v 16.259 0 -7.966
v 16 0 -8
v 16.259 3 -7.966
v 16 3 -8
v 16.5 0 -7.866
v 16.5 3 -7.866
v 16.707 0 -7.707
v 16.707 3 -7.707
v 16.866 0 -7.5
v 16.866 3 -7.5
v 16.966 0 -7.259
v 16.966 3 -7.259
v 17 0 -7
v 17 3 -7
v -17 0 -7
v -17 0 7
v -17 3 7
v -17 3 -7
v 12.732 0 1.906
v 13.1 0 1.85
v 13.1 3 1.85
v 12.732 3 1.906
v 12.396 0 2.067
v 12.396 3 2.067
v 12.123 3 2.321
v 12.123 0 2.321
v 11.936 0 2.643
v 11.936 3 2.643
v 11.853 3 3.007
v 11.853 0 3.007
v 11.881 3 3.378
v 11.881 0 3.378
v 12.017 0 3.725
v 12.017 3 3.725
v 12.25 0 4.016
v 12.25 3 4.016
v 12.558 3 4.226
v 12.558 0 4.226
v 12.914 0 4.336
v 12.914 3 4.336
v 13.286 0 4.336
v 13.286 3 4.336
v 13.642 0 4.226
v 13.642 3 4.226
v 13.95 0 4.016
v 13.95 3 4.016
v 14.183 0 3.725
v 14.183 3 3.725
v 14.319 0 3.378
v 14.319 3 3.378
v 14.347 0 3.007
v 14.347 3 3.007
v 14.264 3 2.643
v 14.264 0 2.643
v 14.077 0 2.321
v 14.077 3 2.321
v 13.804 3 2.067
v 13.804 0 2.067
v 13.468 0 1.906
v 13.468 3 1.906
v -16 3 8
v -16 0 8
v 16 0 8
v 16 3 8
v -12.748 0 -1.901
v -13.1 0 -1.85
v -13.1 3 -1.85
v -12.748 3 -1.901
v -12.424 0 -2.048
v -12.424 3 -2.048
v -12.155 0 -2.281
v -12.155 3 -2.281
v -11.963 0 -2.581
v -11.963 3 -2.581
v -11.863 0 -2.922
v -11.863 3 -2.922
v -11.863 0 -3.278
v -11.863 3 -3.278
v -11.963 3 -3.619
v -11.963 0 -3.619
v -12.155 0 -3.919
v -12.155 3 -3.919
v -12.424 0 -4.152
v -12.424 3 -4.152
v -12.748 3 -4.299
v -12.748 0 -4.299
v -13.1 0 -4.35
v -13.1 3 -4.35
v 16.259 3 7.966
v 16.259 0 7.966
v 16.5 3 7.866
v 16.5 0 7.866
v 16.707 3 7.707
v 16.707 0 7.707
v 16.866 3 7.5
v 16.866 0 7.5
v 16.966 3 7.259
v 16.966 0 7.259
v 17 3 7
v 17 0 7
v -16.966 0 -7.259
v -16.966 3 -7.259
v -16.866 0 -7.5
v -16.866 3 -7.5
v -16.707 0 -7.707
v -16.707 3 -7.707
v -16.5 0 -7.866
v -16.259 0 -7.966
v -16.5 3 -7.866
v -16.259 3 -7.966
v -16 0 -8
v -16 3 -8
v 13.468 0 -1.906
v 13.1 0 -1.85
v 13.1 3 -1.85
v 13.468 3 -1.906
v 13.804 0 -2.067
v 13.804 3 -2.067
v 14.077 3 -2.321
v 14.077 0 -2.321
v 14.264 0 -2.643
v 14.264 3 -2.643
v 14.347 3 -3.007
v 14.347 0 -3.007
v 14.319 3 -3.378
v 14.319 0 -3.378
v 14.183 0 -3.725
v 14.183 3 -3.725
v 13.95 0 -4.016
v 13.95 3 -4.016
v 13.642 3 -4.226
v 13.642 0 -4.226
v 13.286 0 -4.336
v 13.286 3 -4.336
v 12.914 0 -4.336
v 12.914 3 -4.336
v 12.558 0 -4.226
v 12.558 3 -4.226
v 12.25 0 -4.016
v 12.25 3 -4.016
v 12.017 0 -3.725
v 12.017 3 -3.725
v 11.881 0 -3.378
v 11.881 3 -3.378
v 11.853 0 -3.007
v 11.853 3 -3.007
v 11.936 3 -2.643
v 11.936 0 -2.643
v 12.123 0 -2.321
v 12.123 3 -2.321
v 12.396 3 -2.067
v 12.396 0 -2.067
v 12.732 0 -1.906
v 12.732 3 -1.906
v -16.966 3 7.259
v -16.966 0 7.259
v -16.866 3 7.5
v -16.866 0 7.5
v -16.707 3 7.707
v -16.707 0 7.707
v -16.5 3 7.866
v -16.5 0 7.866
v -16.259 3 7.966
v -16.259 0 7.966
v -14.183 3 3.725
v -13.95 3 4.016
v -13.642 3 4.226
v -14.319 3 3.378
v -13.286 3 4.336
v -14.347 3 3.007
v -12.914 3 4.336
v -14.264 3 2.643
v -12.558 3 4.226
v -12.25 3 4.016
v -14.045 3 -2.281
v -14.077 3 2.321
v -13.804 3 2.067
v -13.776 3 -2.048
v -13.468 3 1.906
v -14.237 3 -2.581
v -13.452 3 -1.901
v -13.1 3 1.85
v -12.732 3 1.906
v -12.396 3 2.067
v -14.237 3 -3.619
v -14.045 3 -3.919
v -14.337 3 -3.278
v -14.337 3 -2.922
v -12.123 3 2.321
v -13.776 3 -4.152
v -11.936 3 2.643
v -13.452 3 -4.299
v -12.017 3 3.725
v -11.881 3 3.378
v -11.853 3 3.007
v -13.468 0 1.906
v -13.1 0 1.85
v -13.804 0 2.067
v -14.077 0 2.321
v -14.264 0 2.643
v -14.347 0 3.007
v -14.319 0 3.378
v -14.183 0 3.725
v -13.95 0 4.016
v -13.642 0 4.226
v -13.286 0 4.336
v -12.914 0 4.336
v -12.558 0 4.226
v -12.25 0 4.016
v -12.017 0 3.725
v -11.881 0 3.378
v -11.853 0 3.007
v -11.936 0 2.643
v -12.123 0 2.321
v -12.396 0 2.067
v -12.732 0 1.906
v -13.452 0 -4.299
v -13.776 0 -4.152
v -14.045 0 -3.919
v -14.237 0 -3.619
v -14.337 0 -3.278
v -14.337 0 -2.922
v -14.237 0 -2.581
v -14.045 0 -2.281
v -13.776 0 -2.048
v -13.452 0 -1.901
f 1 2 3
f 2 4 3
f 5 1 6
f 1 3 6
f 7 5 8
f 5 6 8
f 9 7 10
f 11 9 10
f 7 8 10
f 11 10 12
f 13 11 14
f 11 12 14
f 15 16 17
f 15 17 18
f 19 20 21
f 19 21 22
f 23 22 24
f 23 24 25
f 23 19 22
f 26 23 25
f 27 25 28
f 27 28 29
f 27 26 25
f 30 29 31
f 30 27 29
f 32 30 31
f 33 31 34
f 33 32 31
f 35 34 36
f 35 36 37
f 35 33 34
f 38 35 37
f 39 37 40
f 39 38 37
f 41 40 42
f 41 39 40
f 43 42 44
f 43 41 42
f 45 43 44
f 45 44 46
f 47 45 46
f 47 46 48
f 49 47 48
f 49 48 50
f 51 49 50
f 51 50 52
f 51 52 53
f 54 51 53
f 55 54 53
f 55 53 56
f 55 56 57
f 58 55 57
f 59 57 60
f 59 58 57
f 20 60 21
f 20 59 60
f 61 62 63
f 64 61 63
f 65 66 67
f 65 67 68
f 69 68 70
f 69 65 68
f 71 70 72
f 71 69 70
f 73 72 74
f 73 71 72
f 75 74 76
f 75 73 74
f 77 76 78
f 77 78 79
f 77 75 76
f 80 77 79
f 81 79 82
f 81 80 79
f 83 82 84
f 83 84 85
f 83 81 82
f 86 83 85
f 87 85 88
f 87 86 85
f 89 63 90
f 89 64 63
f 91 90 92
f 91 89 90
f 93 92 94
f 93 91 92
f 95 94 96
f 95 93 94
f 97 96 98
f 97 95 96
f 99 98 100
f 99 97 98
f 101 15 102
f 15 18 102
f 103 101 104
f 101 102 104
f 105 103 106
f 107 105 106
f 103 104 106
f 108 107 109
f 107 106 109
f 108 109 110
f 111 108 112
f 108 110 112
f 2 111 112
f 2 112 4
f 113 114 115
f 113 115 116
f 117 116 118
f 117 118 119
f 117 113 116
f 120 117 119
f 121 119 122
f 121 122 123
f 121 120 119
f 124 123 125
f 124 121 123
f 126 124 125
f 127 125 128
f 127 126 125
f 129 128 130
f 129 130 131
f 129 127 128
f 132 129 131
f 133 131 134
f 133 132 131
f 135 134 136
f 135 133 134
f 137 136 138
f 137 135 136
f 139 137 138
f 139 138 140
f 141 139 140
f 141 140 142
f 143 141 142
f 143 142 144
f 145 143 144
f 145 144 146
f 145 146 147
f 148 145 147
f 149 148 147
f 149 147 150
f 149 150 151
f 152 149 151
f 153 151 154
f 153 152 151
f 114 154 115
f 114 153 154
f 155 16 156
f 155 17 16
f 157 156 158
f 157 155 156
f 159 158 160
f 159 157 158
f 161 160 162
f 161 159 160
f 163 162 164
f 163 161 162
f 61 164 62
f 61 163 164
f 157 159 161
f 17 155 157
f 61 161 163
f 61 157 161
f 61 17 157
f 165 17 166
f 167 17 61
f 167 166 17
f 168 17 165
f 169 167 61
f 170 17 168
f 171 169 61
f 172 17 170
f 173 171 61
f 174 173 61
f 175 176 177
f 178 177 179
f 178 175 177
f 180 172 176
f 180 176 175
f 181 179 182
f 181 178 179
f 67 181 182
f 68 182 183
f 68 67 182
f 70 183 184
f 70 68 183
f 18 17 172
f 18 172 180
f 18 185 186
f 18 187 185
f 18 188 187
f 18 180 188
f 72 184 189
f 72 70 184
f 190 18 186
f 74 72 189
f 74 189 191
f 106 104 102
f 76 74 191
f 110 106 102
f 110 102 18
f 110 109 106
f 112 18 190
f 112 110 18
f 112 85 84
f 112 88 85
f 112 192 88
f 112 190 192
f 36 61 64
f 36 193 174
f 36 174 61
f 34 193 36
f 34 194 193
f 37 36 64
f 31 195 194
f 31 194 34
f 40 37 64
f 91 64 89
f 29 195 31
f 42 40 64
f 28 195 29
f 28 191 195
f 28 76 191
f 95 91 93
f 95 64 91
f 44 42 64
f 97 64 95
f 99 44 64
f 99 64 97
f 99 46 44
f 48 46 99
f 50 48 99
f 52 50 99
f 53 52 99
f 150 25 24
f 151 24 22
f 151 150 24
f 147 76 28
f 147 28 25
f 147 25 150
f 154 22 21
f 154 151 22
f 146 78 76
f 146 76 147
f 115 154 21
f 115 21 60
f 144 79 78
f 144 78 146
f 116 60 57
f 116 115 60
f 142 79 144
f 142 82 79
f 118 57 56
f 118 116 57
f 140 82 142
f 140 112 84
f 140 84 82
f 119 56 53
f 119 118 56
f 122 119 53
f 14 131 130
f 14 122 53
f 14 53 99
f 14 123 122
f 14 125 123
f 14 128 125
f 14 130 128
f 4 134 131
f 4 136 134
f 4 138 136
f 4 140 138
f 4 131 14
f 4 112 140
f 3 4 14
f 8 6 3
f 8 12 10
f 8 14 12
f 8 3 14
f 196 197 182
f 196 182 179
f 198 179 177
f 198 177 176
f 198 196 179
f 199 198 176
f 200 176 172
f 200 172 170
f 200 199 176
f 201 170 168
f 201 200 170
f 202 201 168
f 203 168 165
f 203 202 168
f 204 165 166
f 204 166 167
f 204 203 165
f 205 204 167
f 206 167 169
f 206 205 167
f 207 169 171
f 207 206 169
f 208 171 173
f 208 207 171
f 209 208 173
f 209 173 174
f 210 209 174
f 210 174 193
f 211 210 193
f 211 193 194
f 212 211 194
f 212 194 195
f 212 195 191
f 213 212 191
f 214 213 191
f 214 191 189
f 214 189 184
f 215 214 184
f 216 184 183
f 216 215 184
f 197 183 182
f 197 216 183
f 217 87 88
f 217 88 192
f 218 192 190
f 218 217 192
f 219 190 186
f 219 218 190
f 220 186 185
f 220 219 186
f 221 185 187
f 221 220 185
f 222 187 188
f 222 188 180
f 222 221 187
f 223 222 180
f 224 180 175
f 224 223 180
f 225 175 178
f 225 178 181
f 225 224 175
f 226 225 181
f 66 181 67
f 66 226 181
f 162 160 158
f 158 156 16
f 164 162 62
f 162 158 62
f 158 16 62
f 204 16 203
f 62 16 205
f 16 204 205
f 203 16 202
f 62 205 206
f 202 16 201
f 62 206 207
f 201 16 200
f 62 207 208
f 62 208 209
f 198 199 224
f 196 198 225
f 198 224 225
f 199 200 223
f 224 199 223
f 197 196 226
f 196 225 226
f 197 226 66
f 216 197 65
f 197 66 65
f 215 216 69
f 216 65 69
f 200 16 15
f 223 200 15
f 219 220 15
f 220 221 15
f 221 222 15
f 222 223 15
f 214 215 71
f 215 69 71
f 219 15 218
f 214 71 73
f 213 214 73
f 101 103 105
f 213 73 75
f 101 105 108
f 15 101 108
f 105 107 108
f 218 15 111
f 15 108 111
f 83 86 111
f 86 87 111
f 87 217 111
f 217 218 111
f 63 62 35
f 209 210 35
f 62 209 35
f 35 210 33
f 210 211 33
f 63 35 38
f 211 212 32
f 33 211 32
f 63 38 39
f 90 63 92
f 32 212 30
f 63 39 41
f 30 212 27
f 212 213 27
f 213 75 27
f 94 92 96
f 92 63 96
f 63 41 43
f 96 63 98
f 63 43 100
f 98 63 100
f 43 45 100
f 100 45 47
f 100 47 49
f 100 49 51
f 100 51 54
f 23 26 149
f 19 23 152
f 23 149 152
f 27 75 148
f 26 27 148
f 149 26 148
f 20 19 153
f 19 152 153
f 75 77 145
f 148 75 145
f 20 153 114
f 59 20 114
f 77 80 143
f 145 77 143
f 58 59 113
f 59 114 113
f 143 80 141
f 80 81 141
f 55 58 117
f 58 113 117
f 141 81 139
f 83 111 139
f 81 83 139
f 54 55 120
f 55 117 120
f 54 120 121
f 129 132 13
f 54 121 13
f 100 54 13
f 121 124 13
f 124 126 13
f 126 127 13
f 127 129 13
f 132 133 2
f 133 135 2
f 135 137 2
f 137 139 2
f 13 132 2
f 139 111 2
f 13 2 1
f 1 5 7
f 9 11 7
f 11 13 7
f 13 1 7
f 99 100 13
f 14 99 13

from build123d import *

# Parameters (mm, degrees)
SKETCH_3_W      = 34
SKETCH_3_H      = 16
EXTRUDE_3_DEPTH = 3
FILLET_1_R      = 1


with BuildPart() as part:
    # 草图3 → 凸台-拉伸3 (new body)
    with BuildSketch(Plane(origin=(0, 0, 0), x_dir=(1, 0, 0), z_dir=(0, 1, 0))):
        Rectangle(SKETCH_3_W, SKETCH_3_H)
        with BuildLine():
            ThreePointArc((-13.1, -4.35), (-11.85, -3.1), (-13.1, -1.85))
            ThreePointArc((-13.1, -1.85), (-14.35, -3.1), (-13.1, -4.35))
        make_face(mode=Mode.SUBTRACT)
        with BuildLine():
            ThreePointArc((13.1, -4.35), (14.35, -3.1), (13.1, -1.85))
            ThreePointArc((13.1, -1.85), (11.85, -3.1), (13.1, -4.35))
        make_face(mode=Mode.SUBTRACT)
        with BuildLine():
            ThreePointArc((13.1, 4.35), (11.85, 3.100000001), (13.1, 1.850000001))
            ThreePointArc((13.1, 1.850000001), (14.349999999, 3.1), (13.1, 4.35))
        make_face(mode=Mode.SUBTRACT)
        with BuildLine():
            ThreePointArc((-13.1, 1.85), (-11.85, 3.1), (-13.1, 4.349999999))
            ThreePointArc((-13.1, 4.349999999), (-14.35, 3.1), (-13.1, 1.85))
        make_face(mode=Mode.SUBTRACT)
    extrude(amount=EXTRUDE_3_DEPTH)

    # 圆角1
    fillet_1_edges = [part.edges().sort_by_distance(p)[0] for p in [
        (-17, 1.5, -8),
        (17, 1.5, -8),
        (17, 1.5, 8),
        (-17, 1.5, 8),
    ]]
    fillet(fillet_1_edges, radius=FILLET_1_R)


solid = part.part
